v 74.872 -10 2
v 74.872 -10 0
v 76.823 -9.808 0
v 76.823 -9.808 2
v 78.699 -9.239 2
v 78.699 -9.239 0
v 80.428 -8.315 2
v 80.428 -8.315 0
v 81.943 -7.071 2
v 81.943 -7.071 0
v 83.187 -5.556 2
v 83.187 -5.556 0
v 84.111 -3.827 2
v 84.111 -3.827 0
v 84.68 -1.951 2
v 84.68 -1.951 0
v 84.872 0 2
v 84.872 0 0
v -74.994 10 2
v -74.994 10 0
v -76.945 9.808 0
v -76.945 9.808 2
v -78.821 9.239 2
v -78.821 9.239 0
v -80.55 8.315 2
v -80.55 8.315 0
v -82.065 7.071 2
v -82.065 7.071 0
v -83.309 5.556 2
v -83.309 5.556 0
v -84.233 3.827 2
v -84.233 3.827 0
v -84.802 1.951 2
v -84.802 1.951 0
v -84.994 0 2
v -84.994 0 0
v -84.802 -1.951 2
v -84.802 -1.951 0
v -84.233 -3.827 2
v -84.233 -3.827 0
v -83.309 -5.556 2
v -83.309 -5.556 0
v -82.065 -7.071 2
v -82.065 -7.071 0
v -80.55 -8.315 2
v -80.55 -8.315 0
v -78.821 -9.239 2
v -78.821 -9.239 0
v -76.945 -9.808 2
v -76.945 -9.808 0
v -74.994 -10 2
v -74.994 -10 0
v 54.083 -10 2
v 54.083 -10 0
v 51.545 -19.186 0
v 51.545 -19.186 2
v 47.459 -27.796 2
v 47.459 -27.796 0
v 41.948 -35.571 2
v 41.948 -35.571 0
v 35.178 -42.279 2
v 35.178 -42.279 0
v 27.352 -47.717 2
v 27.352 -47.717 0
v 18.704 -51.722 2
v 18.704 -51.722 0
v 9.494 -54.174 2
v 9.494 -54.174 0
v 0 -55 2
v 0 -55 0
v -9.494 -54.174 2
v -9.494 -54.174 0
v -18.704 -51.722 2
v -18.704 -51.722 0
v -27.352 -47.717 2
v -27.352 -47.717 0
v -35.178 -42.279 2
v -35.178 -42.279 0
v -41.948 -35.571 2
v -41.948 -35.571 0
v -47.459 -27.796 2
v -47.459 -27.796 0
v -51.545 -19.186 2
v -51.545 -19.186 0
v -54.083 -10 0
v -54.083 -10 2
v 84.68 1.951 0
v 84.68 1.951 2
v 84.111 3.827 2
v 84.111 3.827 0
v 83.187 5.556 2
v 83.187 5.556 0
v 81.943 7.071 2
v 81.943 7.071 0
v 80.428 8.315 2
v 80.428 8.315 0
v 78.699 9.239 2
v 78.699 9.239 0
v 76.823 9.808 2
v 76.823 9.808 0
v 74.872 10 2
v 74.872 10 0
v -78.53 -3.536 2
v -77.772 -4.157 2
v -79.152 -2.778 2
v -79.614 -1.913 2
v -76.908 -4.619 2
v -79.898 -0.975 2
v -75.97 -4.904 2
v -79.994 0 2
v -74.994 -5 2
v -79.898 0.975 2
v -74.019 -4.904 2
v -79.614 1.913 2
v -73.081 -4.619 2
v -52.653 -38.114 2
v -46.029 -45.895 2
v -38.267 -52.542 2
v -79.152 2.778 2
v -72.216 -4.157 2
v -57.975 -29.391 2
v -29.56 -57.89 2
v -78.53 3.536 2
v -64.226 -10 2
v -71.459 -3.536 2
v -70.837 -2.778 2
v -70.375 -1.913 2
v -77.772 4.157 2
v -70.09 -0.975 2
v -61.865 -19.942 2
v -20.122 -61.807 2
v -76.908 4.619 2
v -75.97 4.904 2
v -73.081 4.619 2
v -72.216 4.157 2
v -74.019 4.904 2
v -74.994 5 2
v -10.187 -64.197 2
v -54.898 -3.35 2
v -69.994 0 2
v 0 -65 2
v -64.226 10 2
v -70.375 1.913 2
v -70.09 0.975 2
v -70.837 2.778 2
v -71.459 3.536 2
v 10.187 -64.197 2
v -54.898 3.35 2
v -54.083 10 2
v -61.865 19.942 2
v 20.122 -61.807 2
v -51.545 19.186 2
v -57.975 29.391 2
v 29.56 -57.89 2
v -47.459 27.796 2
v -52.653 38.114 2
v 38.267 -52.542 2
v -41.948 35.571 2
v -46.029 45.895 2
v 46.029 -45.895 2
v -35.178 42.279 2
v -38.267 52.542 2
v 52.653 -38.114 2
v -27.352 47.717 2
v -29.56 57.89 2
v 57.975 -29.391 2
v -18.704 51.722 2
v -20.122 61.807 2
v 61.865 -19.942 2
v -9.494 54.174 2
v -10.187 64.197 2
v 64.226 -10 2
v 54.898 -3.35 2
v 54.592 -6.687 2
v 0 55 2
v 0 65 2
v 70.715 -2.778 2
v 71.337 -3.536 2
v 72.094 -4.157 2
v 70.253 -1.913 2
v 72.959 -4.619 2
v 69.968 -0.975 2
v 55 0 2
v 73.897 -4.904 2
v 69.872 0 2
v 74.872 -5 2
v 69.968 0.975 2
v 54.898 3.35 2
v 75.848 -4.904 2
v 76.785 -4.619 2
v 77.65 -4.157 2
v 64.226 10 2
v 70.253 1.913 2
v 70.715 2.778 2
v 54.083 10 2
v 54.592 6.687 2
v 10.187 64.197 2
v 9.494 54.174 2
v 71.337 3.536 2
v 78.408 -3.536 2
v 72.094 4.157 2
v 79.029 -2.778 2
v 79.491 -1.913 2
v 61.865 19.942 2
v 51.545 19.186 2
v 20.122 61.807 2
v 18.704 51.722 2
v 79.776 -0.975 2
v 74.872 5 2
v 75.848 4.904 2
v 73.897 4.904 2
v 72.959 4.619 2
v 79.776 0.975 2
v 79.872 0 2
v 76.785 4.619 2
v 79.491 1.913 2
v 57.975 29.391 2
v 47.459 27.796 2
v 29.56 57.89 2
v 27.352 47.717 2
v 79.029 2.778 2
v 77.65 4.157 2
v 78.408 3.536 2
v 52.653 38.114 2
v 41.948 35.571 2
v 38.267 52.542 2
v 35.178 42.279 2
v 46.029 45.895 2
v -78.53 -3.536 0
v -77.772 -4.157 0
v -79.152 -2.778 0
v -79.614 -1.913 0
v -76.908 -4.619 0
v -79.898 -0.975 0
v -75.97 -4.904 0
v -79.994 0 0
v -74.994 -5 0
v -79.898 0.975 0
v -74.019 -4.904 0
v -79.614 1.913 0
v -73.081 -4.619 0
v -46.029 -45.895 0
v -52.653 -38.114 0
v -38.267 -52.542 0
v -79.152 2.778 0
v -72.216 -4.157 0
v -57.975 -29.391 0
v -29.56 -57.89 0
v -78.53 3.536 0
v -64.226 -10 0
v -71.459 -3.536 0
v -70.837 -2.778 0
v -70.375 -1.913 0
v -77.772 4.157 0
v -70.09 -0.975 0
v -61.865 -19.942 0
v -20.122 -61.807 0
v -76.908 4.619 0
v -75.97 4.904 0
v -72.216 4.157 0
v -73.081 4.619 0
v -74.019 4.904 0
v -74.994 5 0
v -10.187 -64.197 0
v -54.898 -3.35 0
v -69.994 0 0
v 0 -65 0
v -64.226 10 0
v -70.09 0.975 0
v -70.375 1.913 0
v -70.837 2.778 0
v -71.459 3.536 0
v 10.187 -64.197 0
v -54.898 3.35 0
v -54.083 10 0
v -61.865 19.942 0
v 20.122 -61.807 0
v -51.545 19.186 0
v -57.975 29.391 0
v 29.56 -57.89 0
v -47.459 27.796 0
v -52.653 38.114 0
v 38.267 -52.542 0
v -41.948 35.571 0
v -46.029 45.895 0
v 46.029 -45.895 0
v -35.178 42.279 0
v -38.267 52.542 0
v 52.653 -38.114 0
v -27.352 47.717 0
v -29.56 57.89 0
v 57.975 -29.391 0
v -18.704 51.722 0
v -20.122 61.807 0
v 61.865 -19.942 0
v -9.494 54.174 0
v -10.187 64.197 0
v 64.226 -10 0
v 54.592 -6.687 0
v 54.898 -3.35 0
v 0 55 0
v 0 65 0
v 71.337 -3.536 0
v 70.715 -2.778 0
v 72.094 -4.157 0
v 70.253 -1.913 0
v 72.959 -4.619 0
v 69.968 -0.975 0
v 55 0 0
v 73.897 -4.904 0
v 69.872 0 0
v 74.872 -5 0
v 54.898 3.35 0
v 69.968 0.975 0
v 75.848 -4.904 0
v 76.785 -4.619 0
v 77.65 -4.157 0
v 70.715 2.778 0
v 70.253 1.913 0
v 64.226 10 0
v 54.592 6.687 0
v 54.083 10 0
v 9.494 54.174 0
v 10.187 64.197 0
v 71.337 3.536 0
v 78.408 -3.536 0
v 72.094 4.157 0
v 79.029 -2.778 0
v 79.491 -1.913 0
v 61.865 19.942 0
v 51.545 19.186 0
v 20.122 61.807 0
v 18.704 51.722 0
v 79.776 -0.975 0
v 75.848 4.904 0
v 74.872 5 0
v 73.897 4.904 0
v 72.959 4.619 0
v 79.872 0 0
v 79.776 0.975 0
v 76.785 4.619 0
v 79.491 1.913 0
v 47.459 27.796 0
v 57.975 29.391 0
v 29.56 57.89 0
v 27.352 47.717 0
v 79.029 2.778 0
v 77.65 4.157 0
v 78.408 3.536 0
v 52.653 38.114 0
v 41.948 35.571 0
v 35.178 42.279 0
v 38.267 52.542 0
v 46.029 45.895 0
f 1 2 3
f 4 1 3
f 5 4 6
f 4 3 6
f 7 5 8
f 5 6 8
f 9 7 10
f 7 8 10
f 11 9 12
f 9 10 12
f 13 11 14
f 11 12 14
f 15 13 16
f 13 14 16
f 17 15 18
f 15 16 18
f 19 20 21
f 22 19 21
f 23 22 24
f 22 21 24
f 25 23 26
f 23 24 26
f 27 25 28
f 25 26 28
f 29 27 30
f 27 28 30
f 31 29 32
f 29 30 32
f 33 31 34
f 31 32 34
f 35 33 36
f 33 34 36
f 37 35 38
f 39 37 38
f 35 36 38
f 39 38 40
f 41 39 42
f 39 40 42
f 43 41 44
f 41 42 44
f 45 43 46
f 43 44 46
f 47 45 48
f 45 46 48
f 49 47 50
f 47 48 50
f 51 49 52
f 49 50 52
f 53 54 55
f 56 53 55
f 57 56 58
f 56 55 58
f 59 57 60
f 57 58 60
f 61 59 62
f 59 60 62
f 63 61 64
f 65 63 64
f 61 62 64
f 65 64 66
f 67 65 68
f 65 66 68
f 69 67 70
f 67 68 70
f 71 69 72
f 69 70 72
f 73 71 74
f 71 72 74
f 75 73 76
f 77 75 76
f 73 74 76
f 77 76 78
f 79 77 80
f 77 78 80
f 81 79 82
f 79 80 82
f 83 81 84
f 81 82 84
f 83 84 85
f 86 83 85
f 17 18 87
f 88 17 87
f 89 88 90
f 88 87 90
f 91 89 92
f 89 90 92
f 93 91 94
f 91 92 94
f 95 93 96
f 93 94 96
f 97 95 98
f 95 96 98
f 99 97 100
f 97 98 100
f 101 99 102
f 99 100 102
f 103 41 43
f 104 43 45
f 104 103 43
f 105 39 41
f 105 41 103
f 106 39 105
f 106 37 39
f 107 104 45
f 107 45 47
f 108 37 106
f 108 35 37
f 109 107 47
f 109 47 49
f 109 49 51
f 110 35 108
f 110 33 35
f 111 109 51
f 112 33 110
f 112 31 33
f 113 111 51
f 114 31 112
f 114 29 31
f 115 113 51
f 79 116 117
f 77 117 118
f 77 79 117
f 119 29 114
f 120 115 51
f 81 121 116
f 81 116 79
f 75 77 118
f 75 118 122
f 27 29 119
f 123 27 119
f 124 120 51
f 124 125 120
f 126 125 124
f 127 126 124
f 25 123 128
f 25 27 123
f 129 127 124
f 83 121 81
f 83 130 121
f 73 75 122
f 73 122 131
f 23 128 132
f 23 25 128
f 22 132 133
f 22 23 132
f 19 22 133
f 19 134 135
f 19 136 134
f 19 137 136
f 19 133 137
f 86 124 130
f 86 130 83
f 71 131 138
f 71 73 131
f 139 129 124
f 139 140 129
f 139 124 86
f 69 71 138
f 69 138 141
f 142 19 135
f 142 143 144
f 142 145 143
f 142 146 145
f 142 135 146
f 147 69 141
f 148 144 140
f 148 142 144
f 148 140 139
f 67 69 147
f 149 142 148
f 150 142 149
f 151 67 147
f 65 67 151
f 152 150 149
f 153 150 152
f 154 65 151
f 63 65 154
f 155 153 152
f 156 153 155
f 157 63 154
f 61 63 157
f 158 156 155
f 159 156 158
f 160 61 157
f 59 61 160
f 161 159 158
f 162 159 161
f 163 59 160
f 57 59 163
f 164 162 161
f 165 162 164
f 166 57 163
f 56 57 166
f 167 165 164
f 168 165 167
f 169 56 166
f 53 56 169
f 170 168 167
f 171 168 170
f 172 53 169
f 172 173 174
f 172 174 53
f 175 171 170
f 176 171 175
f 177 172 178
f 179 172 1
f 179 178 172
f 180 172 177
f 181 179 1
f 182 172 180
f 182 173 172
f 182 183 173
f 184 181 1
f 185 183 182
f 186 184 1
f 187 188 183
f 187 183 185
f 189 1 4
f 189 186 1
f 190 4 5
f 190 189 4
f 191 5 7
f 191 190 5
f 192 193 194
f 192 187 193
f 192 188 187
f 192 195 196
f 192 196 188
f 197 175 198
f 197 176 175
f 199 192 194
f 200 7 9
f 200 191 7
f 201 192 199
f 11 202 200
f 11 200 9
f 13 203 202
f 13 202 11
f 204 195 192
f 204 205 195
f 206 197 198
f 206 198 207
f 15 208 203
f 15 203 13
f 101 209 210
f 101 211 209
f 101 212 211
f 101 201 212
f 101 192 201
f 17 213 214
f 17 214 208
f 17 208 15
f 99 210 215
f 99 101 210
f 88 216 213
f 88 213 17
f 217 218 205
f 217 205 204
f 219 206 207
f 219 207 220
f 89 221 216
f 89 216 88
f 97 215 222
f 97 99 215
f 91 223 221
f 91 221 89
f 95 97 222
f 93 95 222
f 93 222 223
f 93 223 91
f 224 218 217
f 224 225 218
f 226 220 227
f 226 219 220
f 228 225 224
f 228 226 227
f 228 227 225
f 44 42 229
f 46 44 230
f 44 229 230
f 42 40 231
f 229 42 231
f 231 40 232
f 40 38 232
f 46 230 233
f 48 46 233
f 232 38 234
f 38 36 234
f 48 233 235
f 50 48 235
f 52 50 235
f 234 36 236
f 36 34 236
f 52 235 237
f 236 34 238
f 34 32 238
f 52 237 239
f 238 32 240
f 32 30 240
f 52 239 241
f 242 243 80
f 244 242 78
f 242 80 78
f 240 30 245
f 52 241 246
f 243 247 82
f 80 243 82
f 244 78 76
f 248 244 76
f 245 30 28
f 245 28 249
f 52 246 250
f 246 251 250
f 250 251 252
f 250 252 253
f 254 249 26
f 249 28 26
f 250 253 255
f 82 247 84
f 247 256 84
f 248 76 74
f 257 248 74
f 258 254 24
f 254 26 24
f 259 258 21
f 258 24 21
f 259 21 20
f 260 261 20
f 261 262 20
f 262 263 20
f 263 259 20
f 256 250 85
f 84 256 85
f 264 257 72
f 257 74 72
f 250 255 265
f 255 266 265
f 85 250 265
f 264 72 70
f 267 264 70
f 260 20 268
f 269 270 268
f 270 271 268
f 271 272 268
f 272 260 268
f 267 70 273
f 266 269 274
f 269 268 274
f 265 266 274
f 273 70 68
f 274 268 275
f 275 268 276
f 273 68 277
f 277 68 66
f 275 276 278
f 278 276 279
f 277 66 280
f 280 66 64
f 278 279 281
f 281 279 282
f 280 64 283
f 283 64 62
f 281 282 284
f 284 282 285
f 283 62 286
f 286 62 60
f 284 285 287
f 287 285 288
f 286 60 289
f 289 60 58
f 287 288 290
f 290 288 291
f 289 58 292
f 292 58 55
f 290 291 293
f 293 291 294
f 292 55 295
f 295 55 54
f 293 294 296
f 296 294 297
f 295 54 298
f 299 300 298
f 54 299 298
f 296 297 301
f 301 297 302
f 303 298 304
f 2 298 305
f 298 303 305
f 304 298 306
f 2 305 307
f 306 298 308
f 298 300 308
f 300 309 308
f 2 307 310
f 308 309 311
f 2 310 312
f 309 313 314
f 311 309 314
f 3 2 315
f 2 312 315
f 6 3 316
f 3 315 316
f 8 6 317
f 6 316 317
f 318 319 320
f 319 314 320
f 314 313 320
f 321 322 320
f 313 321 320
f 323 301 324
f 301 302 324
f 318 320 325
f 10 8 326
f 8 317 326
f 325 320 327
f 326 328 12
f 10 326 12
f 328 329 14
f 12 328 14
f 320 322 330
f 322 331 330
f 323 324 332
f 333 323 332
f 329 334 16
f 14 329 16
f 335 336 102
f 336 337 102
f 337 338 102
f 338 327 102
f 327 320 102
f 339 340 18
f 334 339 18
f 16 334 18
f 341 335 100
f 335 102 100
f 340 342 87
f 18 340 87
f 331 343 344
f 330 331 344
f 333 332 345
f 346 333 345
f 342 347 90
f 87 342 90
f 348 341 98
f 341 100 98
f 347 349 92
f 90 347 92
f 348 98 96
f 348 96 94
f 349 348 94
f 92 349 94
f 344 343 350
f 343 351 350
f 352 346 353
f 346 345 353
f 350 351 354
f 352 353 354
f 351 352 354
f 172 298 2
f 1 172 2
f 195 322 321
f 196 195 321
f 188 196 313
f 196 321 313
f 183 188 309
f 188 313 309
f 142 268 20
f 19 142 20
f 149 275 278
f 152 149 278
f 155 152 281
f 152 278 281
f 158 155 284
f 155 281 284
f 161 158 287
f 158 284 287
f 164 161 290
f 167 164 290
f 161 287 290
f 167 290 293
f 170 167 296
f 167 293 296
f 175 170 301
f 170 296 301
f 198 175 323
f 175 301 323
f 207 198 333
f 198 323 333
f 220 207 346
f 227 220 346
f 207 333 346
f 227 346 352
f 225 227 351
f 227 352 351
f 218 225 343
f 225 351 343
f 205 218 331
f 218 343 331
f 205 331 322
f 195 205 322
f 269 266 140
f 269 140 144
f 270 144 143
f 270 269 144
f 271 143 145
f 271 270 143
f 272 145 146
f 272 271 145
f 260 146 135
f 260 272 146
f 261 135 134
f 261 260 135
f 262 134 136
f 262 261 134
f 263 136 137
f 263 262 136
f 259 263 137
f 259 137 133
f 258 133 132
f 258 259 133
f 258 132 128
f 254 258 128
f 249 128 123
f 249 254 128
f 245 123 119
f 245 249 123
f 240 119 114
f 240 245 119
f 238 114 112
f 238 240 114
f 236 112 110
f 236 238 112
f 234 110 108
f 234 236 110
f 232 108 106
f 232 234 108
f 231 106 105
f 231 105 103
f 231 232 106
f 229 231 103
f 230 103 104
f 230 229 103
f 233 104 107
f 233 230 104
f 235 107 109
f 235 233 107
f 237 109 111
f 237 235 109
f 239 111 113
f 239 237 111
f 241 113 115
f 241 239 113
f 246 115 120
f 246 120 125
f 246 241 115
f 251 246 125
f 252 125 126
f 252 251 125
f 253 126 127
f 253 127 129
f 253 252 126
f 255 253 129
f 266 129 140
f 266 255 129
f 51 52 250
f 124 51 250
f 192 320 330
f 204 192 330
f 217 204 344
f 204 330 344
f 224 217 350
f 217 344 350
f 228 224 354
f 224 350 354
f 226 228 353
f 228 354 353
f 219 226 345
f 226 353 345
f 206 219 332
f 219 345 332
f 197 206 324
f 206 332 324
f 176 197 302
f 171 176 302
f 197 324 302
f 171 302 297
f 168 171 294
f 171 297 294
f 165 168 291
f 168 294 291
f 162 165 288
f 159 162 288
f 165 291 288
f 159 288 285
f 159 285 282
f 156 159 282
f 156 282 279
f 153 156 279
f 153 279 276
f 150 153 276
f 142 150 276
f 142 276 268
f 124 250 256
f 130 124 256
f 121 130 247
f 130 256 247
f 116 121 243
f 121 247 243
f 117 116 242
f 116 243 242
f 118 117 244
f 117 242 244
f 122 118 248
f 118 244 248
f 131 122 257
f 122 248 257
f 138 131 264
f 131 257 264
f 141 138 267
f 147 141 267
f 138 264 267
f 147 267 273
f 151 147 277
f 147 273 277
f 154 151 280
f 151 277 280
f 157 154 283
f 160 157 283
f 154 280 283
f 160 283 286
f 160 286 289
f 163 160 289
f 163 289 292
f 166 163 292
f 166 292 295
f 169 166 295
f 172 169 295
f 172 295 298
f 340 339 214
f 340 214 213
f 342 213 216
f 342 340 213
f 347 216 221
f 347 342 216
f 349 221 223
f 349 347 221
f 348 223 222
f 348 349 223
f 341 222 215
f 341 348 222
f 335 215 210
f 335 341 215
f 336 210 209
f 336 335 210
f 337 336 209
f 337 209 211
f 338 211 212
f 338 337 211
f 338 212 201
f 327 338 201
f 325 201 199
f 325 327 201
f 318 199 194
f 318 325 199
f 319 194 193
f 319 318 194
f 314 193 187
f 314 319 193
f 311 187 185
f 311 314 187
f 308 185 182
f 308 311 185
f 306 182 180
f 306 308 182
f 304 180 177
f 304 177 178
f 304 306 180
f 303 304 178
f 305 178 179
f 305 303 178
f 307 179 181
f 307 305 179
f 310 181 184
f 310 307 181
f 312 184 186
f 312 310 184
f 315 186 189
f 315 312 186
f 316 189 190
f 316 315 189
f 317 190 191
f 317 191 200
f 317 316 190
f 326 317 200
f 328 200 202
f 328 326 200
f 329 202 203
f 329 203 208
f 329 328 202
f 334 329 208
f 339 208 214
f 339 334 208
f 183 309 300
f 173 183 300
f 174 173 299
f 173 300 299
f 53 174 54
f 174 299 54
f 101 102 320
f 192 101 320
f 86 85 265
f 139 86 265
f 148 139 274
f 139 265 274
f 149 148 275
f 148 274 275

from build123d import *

# Parameters (mm, degrees)
F0_R     = 5
F1_DEPTH = 2


with BuildPart() as f1:
    # F0 (on Top) → F1 (new body)
    with BuildSketch(Plane.XY):
        with BuildLine():
            Line((54.083269132, 10), (64.2261628933, 10))
            ThreePointArc((64.2261628933, 10), (0, 65), (-64.2261628933, 10))
            Line((-64.2261628933, 10), (-54.083269132, 10))
            ThreePointArc((-54.083269132, 10), (0, 55), (54.083269132, 10))
        make_face()
        with BuildLine():
            ThreePointArc((64.9830207232, -1.4856034775), (64.8720541596, 0), (64.9830207232, 1.4856034775))
            ThreePointArc((64.9830207232, 1.4856034775), (64.7447064998, 5.7552567496), (64.2261628933, 10))
            Line((64.2261628933, 10), (54.083269132, 10))
            ThreePointArc((54.083269132, 10), (54.7703377854, 5.0209659301), (55, 0))
            ThreePointArc((55, 0), (54.7703377854, -5.0209659301), (54.083269132, -10))
            Line((54.083269132, -10), (64.2261628933, -10))
            ThreePointArc((64.2261628933, -10), (64.7447064998, -5.7552567496), (64.9830207232, -1.4856034775))
        make_face()
        with BuildLine():
            ThreePointArc((64.2261628933, 10), (64.7447064998, 5.7552567496), (64.9830207232, 1.4856034775))
            ThreePointArc((64.9830207232, 1.4856034775), (68.3473332758, 7.5781275647), (74.8720541596, 10))
            Line((74.8720541596, 10), (64.2261628933, 10))
        make_face()
        with BuildLine():
            ThreePointArc((64.9830207232, 1.4856034775), (64.9957550422, 0.7428502521), (65, 0))
            ThreePointArc((65, 0), (64.9957550422, -0.7428502521), (64.9830207232, -1.4856034775))
            ThreePointArc((64.9830207232, -1.4856034775), (68.3473332758, -7.5781275647), (74.8720541596, -10))
            ThreePointArc((74.8720541596, -10), (81.9431219715, -7.0710678119), (84.8720541596, 0))
            ThreePointArc((84.8720541596, 0), (81.9431219715, 7.0710678119), (74.8720541596, 10))
            ThreePointArc((74.8720541596, 10), (68.3473332758, 7.5781275647), (64.9830207232, 1.4856034775))
        make_face()
        with Locations((74.8720541596, 0)):
            Circle(F0_R, mode=Mode.SUBTRACT)
        with BuildLine():
            ThreePointArc((74.8720541596, -10), (68.3473332758, -7.5781275647), (64.9830207232, -1.4856034775))
            ThreePointArc((64.9830207232, -1.4856034775), (64.7447064998, -5.7552567496), (64.2261628933, -10))
            Line((64.2261628933, -10), (74.8720541596, -10))
        make_face()
        with BuildLine():
            ThreePointArc((-64.2261628933, -10), (0, -65), (64.2261628933, -10))
            Line((64.2261628933, -10), (54.083269132, -10))
            ThreePointArc((54.083269132, -10), (0, -55), (-54.083269132, -10))
            Line((-54.083269132, -10), (-64.2261628933, -10))
        make_face()
        with BuildLine():
            ThreePointArc((-64.9992465548, -0.3129653476), (-65, 0), (-64.9992465548, 0.3129653476))
            ThreePointArc((-64.9992465548, 0.3129653476), (-68.0348097105, 7.1808653338), (-74.9943480303, 10))
            ThreePointArc((-74.9943480303, 10), (-84.9943479896, -1.92e-08), (-74.994347992, -10))
            ThreePointArc((-74.994347992, -10), (-68.0348096967, -7.1808653204), (-64.9992465548, -0.3129653476))
        make_face()
        with Locations((-74.9943479896, 0)):
            Circle(F0_R, mode=Mode.SUBTRACT)
        with BuildLine():
            Line((-74.994347992, -10), (-64.2261628933, -10))
            ThreePointArc((-64.2261628933, -10), (-64.7939910165, -5.1709504109), (-64.9992465548, -0.3129653476))
            ThreePointArc((-64.9992465548, -0.3129653476), (-68.0348096967, -7.1808653204), (-74.994347992, -10))
        make_face()
        with BuildLine():
            ThreePointArc((-64.9992465548, 0.3129653476), (-64.7939910165, 5.1709504109), (-64.2261628933, 10))
            Line((-64.2261628933, 10), (-74.9943480303, 10))
            ThreePointArc((-74.9943480303, 10), (-68.0348097105, 7.1808653338), (-64.9992465548, 0.3129653476))
        make_face()
        with BuildLine():
            Line((-54.083269132, 10), (-64.2261628933, 10))
            ThreePointArc((-64.2261628933, 10), (-64.7939910165, 5.1709504109), (-64.9992465548, 0.3129653476))
            ThreePointArc((-64.9992465548, 0.3129653476), (-64.9955727059, 0.1565018408), (-64.9943479896, 0))
            ThreePointArc((-64.9943479896, 0), (-64.9955727059, -0.1565018408), (-64.9992465548, -0.3129653476))
            ThreePointArc((-64.9992465548, -0.3129653476), (-64.7939910165, -5.1709504109), (-64.2261628933, -10))
            Line((-64.2261628933, -10), (-54.083269132, -10))
            ThreePointArc((-54.083269132, -10), (-55, 0), (-54.083269132, 10))
        make_face()
        with BuildLine():
            ThreePointArc((-64.9943479896, 0), (-64.9955727059, 0.1565018408), (-64.9992465548, 0.3129653476))
            ThreePointArc((-64.9992465548, 0.3129653476), (-65, 0), (-64.9992465548, -0.3129653476))
            ThreePointArc((-64.9992465548, -0.3129653476), (-64.9955727059, -0.1565018408), (-64.9943479896, 0))
        make_face()
        with BuildLine():
            ThreePointArc((64.9830207232, -1.4856034775), (64.9957550422, -0.7428502521), (65, 0))
            ThreePointArc((65, 0), (64.9957550422, 0.7428502521), (64.9830207232, 1.4856034775))
            ThreePointArc((64.9830207232, 1.4856034775), (64.8720541596, 0), (64.9830207232, -1.4856034775))
        make_face()
    extrude(amount=F1_DEPTH)


solid = f1.part
